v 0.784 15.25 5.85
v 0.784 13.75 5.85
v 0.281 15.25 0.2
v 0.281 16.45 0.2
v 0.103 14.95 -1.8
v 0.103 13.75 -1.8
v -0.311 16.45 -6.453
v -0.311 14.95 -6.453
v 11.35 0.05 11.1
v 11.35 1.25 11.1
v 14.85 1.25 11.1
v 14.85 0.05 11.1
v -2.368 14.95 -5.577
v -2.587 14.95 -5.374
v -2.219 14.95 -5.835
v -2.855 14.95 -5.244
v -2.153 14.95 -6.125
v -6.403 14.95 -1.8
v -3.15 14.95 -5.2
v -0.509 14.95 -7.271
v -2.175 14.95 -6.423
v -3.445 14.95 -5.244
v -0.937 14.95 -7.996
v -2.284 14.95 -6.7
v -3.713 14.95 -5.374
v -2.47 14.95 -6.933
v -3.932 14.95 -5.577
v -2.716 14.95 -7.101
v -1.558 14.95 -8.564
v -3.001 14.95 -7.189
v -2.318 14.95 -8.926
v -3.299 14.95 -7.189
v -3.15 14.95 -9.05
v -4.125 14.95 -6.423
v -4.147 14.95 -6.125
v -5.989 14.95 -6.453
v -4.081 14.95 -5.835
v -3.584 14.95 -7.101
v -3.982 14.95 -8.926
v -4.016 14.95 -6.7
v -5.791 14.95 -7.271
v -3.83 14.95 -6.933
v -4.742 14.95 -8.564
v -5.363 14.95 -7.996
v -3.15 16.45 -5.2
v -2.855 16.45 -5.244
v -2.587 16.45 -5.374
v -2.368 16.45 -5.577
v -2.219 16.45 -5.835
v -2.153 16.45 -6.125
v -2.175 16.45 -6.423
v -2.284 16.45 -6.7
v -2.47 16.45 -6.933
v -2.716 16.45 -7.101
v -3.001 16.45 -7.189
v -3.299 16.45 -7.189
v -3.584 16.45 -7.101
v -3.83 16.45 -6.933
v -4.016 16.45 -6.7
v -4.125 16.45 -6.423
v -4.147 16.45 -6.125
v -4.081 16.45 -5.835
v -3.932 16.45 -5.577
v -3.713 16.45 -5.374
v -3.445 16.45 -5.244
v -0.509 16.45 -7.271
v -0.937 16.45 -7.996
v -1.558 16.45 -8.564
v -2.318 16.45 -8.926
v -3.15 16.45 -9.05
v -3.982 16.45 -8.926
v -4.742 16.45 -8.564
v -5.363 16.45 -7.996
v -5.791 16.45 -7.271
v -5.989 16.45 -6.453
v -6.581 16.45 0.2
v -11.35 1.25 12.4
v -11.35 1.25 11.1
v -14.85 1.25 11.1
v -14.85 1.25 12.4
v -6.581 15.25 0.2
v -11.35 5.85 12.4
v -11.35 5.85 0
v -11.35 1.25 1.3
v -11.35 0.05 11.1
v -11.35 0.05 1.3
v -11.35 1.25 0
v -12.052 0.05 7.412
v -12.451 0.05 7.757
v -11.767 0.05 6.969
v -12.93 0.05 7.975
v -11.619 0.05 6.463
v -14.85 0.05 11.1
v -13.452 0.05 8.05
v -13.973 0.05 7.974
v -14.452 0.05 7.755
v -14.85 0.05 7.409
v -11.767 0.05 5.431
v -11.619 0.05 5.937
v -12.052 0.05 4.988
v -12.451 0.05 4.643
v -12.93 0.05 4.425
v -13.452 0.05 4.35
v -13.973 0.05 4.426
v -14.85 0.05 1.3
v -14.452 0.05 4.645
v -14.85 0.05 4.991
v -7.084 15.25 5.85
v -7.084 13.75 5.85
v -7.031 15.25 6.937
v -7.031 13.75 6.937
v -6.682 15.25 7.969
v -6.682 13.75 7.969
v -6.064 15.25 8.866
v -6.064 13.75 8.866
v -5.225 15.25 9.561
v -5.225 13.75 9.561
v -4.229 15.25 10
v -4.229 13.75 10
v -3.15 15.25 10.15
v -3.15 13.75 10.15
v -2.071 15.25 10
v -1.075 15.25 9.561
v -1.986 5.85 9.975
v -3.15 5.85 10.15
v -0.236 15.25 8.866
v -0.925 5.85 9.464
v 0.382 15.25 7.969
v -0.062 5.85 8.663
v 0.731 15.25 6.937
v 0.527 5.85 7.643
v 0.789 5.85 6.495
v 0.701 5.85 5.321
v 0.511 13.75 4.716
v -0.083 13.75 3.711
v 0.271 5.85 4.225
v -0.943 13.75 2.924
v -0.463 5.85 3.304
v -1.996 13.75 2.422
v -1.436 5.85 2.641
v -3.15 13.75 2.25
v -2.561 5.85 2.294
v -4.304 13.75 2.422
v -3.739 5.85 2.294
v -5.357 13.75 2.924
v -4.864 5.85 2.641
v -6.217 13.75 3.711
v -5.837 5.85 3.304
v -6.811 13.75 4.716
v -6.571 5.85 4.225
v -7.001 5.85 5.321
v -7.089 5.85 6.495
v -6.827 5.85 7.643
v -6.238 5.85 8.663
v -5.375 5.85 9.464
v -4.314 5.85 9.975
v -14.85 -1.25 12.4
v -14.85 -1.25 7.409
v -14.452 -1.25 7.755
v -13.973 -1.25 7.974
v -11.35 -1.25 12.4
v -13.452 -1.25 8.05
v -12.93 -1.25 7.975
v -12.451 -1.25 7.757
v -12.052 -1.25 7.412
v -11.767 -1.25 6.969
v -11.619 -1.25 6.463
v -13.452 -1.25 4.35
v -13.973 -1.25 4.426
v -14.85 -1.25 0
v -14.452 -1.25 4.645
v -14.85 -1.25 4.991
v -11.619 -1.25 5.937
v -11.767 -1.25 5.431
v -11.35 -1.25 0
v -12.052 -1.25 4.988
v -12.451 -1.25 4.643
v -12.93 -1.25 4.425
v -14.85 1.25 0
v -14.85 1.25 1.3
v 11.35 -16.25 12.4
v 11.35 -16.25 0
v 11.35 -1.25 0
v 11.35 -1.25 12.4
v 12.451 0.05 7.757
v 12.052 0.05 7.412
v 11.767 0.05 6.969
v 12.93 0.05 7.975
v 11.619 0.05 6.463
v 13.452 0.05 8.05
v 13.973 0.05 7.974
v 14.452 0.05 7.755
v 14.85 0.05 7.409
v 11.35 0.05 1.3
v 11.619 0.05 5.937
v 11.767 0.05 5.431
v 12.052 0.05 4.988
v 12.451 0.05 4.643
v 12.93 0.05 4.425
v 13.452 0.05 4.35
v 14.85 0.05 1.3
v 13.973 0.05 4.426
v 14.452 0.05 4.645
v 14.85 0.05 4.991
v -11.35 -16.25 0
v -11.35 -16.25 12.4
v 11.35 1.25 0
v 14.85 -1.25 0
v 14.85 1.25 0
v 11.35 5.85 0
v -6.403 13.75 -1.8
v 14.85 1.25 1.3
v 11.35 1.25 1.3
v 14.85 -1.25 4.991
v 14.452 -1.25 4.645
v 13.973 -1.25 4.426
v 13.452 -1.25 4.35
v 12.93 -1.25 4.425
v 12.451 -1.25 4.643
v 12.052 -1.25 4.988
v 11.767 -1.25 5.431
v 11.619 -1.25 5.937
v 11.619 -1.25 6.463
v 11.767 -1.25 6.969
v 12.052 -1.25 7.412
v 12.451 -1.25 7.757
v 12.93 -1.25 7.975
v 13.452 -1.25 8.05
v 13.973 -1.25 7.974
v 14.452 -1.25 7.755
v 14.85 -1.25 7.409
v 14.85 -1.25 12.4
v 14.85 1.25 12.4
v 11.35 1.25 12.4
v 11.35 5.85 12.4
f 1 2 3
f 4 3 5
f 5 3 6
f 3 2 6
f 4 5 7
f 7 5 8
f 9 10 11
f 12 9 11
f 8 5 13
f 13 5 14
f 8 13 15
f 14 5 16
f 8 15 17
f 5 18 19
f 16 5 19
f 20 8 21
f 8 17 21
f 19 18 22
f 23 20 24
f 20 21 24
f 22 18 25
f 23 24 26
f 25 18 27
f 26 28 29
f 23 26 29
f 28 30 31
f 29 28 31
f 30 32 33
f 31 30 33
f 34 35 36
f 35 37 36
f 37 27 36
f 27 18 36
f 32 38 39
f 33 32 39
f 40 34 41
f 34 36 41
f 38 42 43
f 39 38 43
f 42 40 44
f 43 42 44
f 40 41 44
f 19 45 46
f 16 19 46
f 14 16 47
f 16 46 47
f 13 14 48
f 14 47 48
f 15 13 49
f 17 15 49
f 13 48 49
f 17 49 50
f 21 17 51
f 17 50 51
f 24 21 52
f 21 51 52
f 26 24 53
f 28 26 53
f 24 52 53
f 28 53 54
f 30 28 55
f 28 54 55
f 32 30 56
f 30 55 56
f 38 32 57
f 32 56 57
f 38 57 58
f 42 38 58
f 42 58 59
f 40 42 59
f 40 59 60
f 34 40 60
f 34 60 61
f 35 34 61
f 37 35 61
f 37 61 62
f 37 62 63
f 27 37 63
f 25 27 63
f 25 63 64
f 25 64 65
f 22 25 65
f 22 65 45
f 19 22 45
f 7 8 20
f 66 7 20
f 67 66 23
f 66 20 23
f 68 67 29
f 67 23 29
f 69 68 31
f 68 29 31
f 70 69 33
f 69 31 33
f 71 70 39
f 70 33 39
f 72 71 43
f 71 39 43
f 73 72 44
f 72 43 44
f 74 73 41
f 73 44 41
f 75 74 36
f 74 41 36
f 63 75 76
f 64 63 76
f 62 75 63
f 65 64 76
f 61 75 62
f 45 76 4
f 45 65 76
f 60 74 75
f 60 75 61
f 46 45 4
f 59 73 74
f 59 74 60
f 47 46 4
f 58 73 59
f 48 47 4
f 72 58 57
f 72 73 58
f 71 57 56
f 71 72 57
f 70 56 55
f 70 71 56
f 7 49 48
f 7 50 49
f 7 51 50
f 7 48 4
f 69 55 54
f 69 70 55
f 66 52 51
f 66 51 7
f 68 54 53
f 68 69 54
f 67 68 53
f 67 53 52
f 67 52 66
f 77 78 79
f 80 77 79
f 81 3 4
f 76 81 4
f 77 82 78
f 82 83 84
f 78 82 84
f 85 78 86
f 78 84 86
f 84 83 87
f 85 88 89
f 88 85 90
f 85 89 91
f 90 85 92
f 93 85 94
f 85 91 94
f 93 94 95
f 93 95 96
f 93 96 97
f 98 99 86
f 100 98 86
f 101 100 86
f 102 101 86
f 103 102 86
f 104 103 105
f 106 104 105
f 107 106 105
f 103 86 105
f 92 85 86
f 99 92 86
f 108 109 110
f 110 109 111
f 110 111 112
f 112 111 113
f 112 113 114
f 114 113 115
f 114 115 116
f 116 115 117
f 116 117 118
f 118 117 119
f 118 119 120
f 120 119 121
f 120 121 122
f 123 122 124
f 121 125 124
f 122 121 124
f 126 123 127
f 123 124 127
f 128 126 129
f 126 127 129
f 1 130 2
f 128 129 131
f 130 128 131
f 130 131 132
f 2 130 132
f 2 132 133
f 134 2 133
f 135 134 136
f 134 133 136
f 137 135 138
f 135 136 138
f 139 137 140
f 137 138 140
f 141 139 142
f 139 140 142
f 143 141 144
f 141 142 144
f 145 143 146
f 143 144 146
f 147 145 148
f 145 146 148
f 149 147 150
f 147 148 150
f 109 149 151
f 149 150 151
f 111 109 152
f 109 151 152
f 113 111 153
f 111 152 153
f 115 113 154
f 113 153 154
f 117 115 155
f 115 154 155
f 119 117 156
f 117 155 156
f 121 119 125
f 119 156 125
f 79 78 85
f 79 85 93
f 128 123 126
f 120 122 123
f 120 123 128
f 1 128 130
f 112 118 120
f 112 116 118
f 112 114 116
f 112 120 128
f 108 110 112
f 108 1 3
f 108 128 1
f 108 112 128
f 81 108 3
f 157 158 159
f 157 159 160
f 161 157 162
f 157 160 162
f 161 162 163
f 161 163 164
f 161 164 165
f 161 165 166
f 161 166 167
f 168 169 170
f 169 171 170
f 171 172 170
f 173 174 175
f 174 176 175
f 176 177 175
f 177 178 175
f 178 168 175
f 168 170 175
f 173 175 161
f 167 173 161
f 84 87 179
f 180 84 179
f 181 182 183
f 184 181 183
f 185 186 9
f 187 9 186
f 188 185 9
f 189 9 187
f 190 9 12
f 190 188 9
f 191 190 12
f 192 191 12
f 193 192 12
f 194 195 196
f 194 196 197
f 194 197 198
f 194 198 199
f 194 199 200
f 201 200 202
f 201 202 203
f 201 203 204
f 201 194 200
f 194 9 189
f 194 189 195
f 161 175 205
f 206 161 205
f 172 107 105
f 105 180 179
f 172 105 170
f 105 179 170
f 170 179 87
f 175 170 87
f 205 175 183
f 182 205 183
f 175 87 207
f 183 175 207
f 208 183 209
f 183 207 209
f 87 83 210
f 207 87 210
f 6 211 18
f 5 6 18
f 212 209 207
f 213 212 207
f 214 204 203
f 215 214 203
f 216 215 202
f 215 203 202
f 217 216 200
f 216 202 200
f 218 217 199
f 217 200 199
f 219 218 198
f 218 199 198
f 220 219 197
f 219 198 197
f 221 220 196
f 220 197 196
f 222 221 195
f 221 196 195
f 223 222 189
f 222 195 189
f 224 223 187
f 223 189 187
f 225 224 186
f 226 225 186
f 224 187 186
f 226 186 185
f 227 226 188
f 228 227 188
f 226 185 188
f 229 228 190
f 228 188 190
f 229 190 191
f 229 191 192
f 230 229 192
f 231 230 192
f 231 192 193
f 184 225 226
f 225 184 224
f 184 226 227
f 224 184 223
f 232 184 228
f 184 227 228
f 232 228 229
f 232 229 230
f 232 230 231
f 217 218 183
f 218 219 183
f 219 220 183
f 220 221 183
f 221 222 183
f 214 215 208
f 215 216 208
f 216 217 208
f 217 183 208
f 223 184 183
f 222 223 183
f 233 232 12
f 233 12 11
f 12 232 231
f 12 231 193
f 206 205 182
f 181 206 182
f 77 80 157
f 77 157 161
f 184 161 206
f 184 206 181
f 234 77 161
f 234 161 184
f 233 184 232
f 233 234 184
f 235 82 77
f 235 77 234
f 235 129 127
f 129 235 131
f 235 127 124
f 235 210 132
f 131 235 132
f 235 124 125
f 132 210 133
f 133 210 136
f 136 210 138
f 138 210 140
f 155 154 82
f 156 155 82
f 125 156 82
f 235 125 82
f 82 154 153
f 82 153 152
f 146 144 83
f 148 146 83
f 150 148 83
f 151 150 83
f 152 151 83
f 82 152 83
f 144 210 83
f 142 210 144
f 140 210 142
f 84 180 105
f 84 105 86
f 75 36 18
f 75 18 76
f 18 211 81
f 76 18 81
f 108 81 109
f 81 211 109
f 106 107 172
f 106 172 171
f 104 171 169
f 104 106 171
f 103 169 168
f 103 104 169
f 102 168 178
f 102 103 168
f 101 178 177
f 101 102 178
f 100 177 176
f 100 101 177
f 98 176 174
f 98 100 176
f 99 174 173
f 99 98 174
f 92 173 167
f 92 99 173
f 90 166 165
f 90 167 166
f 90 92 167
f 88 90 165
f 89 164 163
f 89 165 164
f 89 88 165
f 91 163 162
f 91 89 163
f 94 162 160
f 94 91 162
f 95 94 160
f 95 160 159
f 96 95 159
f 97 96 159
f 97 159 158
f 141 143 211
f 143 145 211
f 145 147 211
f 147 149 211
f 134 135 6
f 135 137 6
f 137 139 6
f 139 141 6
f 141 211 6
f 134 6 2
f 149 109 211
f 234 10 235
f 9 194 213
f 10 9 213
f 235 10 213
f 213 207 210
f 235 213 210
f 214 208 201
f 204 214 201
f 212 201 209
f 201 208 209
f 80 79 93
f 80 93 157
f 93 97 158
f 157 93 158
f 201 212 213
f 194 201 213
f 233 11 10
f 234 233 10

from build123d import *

# Parameters (mm, degrees)
BOSS_EXTRUDE1_DEPTH     = 12.4
CUT_EXTRUDE1_DEPTH      = 1.2
CUT_EXTRUDE2_DEPTH      = 3
SKETCH3_R               = 3.95
TURNBASE_DEPTH          = 7.9
BOSS_EXTRUDE3_DEPTH     = 2.7
CUT_EXTRUDE3_DEPTH      = 26.394586037
CUT_EXTRUDE3_DEPTH_BACK = 26.394586037
SKETCH6_W               = 7.25
SKETCH6_H               = 1.2
SKETCH6_W_2             = 9.95
SKETCH7_R               = 1
CUT_EXTRUDE4_DEPTH      = 38.994374584


with BuildPart() as part:
    # Sketch1 → Boss-Extrude1 (new body)
    with BuildSketch(Plane.XY):
        Polygon((-11.35, -1.25), (-11.35, -16.25), (11.35, -16.25), (11.35, -1.25), (14.85, -1.25), (14.85, 1.25), (11.35, 1.25), (11.35, 5.85), (-11.35, 5.85), (-11.35, 1.25), (-14.85, 1.25), (-14.85, -1.25), align=None)
    extrude(amount=BOSS_EXTRUDE1_DEPTH)

    # Sketch2 → Cut-Extrude1 (cut)
    with BuildSketch(Plane(origin=(0, 1.25, 0), x_dir=(1, 0, 0), z_dir=(0, 1, 0))):
        with BuildLine():
            Line((14.85, -1.3), (11.35, -1.3))
            Line((11.35, -1.3), (11.35, -11.1))
            Line((11.35, -11.1), (14.85, -11.1))
            Line((14.85, -11.1), (14.85, -7.409338662))
            ThreePointArc((14.85, -7.409338662), (11.6, -6.2), (14.85, -4.990661338))
            Line((14.85, -4.990661338), (14.85, -1.3))
        make_face()
    cut_extrude1 = extrude(amount=-CUT_EXTRUDE1_DEPTH, mode=Mode.SUBTRACT)

    # Sketch2<3> → Cut-Extrude2 (cut)
    with BuildSketch(Plane(origin=(0, 1.25, 0), x_dir=(1, 0, 0), z_dir=(0, 1, 0))):
        with BuildLine():
            Line((14.85, -7.409338662), (14.85, -4.990661338))
            ThreePointArc((14.85, -4.990661338), (11.6, -6.2), (14.85, -7.409338662))
        make_face()
    cut_extrude2 = extrude(amount=-CUT_EXTRUDE2_DEPTH, mode=Mode.SUBTRACT)

    # Mirror1: Cut-Extrude1, Cut-Extrude2 across plane
    add(cut_extrude1.mirror(Plane(origin=(0, 0, 0), x_dir=(0, 0, 1), z_dir=(1, 0, 0))), mode=Mode.SUBTRACT)
    add(cut_extrude2.mirror(Plane(origin=(0, 0, 0), x_dir=(0, 0, 1), z_dir=(1, 0, 0))), mode=Mode.SUBTRACT)

    # Sketch3 → TurnBase (add)
    with BuildSketch(Plane(origin=(0, 5.85, 0), x_dir=(1, 0, 0), z_dir=(0, 1, 0))):
        with Locations((-3.15, -6.2)):
            Circle(SKETCH3_R)
    extrude(amount=TURNBASE_DEPTH)

    # Sketch4 → Boss-Extrude3 (add)
    with BuildSketch(Plane(origin=(0, 13.75, 0), x_dir=(1, 0, 0), z_dir=(0, 1, 0))):
        with BuildLine():
            Line((-5.988763946, 6.452822581), (-7.084427224, -5.849596774))
            ThreePointArc((-7.084427224, -5.849596774), (-3.15, -10.15), (0.784427224, -5.849596774))
            Line((0.784427224, -5.849596774), (-0.311236054, 6.452822581))
            ThreePointArc((-0.311236054, 6.452822581), (-3.15, 9.05), (-5.988763946, 6.452822581))
        make_face()
    extrude(amount=BOSS_EXTRUDE3_DEPTH)

    # Sketch6 → Cut-Extrude3 (cut, two sides: drawn at the far end of the back side and taken through both)
    with BuildSketch(Plane(origin=(0, 0, 0), x_dir=(0, 0, -1), z_dir=(1, 0, 0)).offset(-CUT_EXTRUDE3_DEPTH_BACK)):
        with Locations((5.425, 14.35)):
            Rectangle(SKETCH6_W, SKETCH6_H)
        with Locations((-5.175, 15.85)):
            Rectangle(SKETCH6_W_2, SKETCH6_H)
    extrude(amount=CUT_EXTRUDE3_DEPTH + CUT_EXTRUDE3_DEPTH_BACK, mode=Mode.SUBTRACT)

    # Sketch7 → Cut-Extrude4 (cut, through all)
    with BuildSketch(Plane(origin=(0, 16.45, 0), x_dir=(1, 0, 0), z_dir=(0, 1, 0))):
        with Locations((-3.15, 6.2)):
            Circle(SKETCH7_R)
    extrude(amount=-CUT_EXTRUDE4_DEPTH, mode=Mode.SUBTRACT)


solid = part.part
